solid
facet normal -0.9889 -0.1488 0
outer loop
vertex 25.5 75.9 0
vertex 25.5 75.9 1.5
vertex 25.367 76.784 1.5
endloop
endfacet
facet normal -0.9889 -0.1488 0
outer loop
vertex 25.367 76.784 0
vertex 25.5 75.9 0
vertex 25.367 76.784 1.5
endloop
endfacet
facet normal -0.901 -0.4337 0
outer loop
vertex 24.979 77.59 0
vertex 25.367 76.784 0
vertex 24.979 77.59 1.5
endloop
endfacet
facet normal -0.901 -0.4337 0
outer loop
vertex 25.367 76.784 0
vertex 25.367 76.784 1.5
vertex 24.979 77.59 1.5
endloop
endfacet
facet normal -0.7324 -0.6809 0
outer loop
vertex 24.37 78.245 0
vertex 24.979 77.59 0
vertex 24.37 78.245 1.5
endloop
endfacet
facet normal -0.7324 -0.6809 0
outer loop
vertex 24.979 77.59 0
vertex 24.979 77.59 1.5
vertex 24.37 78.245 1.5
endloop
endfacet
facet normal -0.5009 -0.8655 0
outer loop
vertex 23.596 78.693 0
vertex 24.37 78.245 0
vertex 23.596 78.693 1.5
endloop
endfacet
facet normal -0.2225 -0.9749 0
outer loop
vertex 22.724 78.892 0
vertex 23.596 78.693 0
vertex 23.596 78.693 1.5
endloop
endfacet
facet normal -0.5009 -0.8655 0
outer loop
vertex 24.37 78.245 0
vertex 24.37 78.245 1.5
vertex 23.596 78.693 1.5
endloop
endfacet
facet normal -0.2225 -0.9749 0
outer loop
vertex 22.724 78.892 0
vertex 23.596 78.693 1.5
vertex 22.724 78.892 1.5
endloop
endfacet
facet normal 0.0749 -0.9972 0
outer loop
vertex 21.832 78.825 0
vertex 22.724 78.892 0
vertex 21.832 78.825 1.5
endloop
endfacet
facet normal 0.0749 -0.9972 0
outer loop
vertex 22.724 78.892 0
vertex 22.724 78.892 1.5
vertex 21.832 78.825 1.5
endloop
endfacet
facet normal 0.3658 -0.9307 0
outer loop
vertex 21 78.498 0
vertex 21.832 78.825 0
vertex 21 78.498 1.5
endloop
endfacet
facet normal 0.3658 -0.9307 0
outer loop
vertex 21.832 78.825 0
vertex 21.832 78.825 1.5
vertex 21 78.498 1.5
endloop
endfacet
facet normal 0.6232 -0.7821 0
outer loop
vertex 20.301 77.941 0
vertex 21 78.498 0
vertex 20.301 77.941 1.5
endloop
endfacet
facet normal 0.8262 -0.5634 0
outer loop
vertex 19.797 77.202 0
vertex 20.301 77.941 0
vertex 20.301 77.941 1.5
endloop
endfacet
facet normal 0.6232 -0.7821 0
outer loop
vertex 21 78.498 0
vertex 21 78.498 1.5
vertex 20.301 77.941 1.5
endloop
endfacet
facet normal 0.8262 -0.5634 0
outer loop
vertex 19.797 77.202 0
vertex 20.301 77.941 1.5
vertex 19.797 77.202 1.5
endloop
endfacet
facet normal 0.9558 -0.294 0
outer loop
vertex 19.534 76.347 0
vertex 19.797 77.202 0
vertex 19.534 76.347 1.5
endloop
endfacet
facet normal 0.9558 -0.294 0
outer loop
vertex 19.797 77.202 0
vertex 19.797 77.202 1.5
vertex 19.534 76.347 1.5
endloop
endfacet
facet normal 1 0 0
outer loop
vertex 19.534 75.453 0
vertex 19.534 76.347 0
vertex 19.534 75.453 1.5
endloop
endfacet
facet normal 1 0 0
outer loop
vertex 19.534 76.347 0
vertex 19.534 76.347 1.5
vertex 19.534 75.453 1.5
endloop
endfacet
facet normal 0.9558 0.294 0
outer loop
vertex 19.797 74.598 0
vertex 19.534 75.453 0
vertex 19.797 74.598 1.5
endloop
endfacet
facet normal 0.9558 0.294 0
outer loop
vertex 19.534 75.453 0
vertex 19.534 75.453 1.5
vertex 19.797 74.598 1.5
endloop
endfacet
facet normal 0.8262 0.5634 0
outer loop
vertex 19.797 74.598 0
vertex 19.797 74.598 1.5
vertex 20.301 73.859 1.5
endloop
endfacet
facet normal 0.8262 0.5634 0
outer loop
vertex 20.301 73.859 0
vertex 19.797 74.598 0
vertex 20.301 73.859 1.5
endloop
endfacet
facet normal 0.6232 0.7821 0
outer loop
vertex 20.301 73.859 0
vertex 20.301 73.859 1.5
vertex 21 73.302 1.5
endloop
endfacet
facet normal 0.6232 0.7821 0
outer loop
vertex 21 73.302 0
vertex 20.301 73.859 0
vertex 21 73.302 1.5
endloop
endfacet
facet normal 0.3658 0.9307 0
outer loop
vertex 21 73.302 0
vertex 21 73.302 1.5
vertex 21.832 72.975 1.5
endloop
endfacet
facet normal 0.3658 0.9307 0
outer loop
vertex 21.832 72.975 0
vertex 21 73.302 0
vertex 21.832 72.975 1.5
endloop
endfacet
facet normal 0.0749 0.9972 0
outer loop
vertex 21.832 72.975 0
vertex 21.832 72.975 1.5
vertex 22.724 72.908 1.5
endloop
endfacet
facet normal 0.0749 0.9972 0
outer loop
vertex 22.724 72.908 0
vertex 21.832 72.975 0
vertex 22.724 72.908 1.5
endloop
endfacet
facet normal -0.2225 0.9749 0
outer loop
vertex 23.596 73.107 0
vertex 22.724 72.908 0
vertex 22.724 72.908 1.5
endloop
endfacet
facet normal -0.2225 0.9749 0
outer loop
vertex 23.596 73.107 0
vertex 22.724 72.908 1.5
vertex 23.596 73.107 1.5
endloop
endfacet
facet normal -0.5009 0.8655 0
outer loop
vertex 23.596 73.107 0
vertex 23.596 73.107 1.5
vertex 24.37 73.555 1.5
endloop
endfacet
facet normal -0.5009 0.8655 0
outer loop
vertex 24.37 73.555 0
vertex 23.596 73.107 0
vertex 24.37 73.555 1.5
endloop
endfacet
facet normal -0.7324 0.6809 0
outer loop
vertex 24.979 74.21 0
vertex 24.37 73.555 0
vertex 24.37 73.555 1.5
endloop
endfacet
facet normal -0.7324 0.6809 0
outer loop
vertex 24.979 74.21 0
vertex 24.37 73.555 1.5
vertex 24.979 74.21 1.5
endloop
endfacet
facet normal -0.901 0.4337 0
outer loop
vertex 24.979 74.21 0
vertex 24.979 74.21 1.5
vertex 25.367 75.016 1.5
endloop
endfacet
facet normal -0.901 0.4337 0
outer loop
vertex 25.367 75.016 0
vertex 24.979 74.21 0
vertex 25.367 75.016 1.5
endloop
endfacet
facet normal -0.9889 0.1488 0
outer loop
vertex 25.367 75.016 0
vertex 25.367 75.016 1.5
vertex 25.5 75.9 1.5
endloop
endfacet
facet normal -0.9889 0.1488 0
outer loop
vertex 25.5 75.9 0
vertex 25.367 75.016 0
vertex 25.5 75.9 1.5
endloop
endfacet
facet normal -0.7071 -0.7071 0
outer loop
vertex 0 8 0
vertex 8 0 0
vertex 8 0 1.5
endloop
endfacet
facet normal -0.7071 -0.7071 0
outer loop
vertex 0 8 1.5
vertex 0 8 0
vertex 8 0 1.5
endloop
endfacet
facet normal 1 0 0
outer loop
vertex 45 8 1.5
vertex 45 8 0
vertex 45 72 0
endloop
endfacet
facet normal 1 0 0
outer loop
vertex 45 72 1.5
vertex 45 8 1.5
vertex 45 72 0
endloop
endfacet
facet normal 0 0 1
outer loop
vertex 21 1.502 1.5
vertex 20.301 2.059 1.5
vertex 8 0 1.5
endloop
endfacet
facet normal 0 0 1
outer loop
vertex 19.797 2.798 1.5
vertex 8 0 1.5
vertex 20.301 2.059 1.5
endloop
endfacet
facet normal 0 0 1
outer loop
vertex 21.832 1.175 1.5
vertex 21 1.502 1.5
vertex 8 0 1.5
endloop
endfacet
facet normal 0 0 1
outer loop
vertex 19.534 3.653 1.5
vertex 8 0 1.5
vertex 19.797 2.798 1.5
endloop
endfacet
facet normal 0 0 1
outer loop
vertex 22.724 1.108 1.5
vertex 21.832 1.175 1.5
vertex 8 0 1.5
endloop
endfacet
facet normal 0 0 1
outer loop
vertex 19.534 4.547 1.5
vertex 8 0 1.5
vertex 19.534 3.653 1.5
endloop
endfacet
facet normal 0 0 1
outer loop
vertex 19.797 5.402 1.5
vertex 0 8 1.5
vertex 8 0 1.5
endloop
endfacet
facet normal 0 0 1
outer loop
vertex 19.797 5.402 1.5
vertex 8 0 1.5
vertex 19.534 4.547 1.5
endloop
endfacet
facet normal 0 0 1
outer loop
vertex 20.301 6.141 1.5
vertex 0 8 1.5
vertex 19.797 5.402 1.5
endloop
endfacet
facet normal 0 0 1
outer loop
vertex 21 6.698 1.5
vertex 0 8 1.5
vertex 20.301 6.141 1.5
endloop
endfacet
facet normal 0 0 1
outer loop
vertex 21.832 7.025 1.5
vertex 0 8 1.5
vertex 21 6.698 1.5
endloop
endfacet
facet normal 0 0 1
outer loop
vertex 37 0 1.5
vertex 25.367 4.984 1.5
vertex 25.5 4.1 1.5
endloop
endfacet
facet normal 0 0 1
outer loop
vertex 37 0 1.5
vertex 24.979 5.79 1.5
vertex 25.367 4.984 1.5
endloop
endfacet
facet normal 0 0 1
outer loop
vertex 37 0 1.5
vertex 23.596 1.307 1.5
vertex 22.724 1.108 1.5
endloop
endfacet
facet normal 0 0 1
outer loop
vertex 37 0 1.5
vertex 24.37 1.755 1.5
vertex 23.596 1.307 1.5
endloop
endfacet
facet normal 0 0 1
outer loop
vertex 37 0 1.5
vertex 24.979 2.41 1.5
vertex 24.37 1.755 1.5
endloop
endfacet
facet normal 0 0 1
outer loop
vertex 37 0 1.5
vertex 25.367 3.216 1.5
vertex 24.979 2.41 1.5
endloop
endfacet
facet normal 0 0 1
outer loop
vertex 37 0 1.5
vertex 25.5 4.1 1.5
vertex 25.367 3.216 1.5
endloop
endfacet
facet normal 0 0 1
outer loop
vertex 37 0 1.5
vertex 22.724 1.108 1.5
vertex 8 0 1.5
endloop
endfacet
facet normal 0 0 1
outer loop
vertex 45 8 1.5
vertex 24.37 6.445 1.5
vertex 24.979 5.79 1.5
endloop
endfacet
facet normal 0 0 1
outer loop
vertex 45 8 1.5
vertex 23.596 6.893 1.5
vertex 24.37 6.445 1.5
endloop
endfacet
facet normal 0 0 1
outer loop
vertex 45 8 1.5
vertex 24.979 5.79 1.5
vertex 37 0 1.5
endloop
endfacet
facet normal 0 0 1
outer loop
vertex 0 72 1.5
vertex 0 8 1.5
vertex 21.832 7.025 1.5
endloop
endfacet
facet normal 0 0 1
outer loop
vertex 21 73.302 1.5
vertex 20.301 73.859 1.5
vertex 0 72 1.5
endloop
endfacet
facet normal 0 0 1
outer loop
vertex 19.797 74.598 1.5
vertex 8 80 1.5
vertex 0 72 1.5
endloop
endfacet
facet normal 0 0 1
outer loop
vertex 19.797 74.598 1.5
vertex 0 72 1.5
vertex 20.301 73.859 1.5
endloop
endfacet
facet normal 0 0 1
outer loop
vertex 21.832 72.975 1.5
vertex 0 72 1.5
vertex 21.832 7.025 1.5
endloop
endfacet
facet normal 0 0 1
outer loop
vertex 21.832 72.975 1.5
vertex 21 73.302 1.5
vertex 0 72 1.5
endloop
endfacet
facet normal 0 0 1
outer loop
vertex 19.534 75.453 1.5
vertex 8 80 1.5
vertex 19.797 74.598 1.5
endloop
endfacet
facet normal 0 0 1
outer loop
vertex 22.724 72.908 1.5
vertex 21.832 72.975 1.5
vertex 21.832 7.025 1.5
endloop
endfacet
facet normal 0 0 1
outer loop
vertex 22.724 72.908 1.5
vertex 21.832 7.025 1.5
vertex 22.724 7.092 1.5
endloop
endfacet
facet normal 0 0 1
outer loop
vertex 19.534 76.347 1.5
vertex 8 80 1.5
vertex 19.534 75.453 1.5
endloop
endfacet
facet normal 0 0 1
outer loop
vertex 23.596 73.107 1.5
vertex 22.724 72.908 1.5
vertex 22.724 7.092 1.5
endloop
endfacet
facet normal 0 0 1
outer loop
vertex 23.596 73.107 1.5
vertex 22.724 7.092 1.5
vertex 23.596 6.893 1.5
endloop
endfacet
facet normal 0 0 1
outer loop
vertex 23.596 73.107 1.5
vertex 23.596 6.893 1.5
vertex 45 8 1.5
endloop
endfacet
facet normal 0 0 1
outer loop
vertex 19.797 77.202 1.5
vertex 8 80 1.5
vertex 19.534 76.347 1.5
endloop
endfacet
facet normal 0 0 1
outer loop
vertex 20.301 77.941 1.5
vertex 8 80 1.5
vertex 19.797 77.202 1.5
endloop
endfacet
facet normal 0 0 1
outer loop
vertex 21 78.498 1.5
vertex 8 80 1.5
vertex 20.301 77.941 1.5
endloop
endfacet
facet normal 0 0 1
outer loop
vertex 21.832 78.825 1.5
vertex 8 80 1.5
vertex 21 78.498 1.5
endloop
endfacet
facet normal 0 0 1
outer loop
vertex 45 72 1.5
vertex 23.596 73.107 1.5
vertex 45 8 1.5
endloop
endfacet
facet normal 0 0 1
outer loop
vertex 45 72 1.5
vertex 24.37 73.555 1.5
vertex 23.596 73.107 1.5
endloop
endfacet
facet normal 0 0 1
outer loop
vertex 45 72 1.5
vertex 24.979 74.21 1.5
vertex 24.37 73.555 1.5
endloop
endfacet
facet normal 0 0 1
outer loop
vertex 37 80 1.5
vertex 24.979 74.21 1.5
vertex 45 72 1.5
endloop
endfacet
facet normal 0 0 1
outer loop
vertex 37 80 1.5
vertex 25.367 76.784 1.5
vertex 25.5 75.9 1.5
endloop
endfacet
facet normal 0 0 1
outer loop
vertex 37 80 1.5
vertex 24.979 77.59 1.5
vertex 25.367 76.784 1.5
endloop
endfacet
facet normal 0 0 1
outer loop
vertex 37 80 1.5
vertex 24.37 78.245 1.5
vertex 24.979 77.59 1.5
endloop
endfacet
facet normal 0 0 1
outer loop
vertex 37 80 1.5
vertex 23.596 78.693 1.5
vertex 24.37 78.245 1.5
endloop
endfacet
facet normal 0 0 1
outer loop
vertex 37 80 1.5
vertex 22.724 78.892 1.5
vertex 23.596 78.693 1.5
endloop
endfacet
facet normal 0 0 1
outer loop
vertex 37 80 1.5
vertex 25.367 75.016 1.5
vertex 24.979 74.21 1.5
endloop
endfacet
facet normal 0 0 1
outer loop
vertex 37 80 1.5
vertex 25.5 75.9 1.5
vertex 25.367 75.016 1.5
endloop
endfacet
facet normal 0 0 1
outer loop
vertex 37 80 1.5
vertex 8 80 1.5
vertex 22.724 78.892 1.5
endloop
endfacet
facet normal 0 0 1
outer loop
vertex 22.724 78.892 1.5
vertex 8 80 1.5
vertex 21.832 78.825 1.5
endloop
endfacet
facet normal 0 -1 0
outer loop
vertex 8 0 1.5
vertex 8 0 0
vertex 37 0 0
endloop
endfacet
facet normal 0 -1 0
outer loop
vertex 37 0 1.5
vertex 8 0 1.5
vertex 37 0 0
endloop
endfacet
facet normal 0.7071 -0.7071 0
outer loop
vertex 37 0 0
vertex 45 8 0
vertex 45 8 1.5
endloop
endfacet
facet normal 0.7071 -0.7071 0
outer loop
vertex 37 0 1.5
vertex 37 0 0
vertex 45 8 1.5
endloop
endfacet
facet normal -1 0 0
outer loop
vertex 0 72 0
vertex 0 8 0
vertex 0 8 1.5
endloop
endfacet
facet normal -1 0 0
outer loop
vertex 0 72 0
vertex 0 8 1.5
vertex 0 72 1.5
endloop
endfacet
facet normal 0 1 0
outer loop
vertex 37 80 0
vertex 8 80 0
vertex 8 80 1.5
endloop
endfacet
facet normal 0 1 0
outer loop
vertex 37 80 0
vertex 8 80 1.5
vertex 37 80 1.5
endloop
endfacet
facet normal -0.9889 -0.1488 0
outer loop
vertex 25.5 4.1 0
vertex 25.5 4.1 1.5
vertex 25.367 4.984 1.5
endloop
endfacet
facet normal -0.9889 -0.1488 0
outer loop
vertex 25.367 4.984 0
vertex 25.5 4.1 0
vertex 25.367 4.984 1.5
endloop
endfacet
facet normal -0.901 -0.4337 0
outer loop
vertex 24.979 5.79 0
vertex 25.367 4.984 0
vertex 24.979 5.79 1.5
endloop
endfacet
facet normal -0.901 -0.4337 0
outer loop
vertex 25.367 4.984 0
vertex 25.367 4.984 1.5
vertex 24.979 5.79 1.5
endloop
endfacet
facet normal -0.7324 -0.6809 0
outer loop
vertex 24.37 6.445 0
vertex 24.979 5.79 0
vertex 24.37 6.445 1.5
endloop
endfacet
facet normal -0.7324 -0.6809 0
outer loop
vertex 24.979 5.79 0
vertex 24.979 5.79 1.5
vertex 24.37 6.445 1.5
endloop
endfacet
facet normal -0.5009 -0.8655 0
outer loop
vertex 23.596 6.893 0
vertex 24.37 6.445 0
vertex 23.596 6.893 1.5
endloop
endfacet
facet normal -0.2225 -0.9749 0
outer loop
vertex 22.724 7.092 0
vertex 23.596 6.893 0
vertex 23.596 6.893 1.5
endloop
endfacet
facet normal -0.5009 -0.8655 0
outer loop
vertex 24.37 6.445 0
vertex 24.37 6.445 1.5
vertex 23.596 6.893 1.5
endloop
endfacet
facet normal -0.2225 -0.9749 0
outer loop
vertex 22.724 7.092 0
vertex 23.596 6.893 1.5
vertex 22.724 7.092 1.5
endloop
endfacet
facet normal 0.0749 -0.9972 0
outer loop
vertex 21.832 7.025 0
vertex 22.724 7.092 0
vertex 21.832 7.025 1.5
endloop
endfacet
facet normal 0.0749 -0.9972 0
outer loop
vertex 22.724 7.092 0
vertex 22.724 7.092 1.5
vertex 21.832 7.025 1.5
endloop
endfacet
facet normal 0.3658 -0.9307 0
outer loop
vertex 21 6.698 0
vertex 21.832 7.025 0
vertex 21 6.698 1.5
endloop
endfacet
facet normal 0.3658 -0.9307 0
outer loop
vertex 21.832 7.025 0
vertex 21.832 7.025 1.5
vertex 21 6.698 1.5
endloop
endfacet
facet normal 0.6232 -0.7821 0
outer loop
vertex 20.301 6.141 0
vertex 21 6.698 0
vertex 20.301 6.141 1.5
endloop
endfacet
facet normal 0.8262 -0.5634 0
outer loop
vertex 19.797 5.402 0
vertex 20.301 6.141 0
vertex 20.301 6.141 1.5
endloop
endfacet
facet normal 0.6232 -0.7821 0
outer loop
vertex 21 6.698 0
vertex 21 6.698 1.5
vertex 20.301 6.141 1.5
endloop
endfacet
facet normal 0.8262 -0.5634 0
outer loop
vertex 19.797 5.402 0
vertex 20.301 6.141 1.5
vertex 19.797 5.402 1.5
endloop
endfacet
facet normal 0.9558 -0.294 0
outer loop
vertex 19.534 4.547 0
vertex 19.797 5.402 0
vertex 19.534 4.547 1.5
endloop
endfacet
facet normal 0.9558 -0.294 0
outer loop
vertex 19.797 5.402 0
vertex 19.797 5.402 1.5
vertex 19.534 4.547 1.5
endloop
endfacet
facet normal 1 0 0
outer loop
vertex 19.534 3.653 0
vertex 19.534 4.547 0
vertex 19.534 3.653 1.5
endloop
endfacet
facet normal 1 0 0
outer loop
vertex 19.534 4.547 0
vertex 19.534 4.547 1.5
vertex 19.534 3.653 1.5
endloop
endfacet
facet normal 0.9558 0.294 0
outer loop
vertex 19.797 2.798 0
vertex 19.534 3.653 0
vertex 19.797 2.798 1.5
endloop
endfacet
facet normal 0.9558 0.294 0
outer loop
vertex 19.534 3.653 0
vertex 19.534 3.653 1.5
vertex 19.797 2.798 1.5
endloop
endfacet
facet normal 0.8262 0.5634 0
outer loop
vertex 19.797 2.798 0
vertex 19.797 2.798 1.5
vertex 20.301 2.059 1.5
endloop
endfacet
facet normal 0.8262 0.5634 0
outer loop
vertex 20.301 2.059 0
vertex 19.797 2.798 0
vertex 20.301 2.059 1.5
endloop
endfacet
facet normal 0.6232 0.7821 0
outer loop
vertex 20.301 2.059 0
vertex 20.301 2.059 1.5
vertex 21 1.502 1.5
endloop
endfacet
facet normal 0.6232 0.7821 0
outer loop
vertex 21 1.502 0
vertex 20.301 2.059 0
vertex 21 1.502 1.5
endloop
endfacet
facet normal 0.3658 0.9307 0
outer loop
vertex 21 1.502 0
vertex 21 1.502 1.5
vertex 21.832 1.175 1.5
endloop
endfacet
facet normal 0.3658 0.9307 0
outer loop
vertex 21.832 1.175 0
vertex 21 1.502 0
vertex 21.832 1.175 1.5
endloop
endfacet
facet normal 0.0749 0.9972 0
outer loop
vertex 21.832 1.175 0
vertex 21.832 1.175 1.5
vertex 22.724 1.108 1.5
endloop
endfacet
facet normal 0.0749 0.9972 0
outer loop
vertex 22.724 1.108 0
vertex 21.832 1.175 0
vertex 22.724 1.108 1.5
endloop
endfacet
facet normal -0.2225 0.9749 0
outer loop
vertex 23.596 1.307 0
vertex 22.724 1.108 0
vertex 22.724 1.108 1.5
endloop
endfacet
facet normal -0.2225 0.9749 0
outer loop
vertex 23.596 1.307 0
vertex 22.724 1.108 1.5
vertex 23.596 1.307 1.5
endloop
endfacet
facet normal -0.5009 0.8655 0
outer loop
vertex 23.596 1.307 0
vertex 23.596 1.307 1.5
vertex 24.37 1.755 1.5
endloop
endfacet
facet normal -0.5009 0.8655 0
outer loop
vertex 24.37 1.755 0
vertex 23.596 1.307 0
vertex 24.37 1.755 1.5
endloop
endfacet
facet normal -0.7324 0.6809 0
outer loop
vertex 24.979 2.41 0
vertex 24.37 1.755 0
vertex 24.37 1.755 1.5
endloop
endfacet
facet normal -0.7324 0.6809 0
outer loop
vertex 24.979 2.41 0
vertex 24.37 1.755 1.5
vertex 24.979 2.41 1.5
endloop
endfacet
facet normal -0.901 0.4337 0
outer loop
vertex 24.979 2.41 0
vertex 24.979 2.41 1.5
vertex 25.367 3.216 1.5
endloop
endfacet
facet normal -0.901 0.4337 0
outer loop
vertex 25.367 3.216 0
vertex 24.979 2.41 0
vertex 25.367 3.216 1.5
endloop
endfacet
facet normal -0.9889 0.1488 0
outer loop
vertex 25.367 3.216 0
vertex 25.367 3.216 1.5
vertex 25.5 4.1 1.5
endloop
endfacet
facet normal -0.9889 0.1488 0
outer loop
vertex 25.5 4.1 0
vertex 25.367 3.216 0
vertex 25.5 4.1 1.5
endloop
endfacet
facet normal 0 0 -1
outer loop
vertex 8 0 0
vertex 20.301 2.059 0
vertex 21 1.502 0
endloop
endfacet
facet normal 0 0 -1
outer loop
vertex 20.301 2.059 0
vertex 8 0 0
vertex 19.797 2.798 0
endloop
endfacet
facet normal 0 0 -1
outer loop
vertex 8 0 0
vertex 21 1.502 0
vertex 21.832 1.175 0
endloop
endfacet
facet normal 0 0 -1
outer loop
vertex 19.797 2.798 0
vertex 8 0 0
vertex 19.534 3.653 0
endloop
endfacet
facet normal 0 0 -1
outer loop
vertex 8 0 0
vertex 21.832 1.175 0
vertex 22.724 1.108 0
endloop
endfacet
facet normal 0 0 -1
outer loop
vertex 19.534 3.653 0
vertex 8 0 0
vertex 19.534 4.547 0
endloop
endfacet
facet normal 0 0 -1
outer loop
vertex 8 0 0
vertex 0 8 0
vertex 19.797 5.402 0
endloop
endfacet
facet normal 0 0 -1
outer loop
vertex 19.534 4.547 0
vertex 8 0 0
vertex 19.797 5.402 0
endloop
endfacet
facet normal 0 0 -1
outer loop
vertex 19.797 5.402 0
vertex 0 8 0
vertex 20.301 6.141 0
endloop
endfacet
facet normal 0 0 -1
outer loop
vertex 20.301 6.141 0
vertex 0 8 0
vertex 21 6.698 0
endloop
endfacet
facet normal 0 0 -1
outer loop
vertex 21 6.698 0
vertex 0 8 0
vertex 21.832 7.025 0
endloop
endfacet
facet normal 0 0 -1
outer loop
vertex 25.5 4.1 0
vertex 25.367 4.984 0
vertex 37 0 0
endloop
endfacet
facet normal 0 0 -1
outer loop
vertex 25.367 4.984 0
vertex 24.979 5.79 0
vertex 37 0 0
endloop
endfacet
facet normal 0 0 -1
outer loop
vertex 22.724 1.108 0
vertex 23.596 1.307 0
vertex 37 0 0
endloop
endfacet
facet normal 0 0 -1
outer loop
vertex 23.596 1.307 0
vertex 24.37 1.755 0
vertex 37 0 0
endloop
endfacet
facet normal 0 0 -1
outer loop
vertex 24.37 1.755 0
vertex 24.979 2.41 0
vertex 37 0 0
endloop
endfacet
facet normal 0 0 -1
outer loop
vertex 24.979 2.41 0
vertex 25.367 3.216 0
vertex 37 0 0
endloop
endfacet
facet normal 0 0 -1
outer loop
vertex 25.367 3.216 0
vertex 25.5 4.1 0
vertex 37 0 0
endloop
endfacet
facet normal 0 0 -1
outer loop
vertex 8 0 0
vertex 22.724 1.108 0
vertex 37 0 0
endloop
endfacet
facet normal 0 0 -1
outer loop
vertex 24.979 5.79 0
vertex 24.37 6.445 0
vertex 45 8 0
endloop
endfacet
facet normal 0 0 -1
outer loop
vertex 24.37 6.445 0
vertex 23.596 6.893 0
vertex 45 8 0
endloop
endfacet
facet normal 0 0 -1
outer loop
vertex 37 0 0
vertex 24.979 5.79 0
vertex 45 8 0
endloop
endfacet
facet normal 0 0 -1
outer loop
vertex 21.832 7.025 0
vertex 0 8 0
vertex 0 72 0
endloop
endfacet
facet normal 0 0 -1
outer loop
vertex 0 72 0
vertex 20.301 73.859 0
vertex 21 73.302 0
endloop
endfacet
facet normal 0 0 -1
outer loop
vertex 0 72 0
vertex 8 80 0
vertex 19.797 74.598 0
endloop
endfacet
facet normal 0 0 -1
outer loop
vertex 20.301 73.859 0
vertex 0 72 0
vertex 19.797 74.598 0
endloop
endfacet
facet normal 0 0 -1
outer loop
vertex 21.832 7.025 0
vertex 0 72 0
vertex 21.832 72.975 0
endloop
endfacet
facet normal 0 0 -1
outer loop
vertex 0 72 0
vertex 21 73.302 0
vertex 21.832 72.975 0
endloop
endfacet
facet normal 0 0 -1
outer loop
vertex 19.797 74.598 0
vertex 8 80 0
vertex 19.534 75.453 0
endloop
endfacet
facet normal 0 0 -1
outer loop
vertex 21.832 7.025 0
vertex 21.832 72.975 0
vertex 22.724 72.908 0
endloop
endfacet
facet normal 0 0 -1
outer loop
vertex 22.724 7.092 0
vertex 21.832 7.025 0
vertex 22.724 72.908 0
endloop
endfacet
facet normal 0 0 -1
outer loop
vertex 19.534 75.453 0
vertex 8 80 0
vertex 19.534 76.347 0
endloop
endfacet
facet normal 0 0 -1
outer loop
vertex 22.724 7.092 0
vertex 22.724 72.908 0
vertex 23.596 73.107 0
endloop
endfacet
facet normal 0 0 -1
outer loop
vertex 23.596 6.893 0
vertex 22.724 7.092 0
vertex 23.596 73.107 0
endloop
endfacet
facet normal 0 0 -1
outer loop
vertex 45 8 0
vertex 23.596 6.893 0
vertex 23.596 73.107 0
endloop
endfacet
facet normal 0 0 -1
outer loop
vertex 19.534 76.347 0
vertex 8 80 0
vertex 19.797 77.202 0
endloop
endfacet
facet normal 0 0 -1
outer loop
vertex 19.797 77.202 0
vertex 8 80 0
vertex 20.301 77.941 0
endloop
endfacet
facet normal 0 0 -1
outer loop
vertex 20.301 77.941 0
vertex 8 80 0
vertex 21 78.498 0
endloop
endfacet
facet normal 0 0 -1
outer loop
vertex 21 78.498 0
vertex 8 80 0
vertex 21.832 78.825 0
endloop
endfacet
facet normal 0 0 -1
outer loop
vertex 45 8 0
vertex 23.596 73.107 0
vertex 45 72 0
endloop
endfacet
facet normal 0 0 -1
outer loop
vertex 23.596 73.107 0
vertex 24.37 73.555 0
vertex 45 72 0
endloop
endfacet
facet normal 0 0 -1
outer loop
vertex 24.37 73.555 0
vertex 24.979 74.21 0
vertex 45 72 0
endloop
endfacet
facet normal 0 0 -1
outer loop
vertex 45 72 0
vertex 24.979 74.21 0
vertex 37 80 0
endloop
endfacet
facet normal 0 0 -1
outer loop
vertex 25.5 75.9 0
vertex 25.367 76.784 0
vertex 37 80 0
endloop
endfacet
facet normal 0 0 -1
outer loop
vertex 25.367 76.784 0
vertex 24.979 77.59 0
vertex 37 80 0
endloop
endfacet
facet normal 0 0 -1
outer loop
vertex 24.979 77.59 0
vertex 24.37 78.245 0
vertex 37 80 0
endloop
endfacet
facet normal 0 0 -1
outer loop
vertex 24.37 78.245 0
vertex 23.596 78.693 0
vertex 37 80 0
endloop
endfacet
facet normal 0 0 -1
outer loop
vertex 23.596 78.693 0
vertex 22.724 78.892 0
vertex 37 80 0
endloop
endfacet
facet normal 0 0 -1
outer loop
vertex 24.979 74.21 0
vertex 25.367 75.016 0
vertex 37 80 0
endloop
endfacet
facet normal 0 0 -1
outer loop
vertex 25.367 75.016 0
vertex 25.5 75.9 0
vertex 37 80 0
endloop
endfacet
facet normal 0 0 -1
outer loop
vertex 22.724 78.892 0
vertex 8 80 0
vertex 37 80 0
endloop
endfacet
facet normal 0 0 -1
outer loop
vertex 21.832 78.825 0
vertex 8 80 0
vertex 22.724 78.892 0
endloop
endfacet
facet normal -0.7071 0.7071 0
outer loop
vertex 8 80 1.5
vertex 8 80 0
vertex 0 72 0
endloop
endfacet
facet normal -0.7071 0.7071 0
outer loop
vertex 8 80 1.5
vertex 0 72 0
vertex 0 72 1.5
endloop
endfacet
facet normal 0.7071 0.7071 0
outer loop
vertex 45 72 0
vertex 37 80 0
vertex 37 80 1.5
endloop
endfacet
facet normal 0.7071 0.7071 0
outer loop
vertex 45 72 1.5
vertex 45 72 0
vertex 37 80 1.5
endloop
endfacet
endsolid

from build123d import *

# Parameters (mm, degrees)
ESQUISSE1_W             = 45
ESQUISSE1_H             = 80
BOSS_EXTRU_1_DEPTH      = 1.5
CHANFREIN1_SIZE         = 8
ESQUISSE2_R             = 3
ENL_V_MAT_EXTRU_1_DEPTH = 2.5


with BuildPart() as part:
    # Esquisse1 → Boss.-Extru.1 (new body)
    with BuildSketch(Plane.XY):
        with Locations((22.5, 40)):
            Rectangle(ESQUISSE1_W, ESQUISSE1_H)
    extrude(amount=BOSS_EXTRU_1_DEPTH)

    # Chanfrein1
    chanfrein1_edges = [part.edges().sort_by_distance(p)[0] for p in [
        (0, 80, 0.75),
        (45, 80, 0.75),
        (45, 0, 0.75),
        (0, 0, 0.75),
    ]]
    chamfer(chanfrein1_edges, length=CHANFREIN1_SIZE)

    # Esquisse2 → Enlèv. mat.-Extru.1 (cut, through all)
    with BuildSketch(Plane.XY.offset(1.5)):
        with Locations((22.5, 75.9)):
            Circle(ESQUISSE2_R)
        with Locations((22.5, 4.1)):
            Circle(ESQUISSE2_R)
    extrude(amount=-ENL_V_MAT_EXTRU_1_DEPTH, mode=Mode.SUBTRACT)


solid = part.part
